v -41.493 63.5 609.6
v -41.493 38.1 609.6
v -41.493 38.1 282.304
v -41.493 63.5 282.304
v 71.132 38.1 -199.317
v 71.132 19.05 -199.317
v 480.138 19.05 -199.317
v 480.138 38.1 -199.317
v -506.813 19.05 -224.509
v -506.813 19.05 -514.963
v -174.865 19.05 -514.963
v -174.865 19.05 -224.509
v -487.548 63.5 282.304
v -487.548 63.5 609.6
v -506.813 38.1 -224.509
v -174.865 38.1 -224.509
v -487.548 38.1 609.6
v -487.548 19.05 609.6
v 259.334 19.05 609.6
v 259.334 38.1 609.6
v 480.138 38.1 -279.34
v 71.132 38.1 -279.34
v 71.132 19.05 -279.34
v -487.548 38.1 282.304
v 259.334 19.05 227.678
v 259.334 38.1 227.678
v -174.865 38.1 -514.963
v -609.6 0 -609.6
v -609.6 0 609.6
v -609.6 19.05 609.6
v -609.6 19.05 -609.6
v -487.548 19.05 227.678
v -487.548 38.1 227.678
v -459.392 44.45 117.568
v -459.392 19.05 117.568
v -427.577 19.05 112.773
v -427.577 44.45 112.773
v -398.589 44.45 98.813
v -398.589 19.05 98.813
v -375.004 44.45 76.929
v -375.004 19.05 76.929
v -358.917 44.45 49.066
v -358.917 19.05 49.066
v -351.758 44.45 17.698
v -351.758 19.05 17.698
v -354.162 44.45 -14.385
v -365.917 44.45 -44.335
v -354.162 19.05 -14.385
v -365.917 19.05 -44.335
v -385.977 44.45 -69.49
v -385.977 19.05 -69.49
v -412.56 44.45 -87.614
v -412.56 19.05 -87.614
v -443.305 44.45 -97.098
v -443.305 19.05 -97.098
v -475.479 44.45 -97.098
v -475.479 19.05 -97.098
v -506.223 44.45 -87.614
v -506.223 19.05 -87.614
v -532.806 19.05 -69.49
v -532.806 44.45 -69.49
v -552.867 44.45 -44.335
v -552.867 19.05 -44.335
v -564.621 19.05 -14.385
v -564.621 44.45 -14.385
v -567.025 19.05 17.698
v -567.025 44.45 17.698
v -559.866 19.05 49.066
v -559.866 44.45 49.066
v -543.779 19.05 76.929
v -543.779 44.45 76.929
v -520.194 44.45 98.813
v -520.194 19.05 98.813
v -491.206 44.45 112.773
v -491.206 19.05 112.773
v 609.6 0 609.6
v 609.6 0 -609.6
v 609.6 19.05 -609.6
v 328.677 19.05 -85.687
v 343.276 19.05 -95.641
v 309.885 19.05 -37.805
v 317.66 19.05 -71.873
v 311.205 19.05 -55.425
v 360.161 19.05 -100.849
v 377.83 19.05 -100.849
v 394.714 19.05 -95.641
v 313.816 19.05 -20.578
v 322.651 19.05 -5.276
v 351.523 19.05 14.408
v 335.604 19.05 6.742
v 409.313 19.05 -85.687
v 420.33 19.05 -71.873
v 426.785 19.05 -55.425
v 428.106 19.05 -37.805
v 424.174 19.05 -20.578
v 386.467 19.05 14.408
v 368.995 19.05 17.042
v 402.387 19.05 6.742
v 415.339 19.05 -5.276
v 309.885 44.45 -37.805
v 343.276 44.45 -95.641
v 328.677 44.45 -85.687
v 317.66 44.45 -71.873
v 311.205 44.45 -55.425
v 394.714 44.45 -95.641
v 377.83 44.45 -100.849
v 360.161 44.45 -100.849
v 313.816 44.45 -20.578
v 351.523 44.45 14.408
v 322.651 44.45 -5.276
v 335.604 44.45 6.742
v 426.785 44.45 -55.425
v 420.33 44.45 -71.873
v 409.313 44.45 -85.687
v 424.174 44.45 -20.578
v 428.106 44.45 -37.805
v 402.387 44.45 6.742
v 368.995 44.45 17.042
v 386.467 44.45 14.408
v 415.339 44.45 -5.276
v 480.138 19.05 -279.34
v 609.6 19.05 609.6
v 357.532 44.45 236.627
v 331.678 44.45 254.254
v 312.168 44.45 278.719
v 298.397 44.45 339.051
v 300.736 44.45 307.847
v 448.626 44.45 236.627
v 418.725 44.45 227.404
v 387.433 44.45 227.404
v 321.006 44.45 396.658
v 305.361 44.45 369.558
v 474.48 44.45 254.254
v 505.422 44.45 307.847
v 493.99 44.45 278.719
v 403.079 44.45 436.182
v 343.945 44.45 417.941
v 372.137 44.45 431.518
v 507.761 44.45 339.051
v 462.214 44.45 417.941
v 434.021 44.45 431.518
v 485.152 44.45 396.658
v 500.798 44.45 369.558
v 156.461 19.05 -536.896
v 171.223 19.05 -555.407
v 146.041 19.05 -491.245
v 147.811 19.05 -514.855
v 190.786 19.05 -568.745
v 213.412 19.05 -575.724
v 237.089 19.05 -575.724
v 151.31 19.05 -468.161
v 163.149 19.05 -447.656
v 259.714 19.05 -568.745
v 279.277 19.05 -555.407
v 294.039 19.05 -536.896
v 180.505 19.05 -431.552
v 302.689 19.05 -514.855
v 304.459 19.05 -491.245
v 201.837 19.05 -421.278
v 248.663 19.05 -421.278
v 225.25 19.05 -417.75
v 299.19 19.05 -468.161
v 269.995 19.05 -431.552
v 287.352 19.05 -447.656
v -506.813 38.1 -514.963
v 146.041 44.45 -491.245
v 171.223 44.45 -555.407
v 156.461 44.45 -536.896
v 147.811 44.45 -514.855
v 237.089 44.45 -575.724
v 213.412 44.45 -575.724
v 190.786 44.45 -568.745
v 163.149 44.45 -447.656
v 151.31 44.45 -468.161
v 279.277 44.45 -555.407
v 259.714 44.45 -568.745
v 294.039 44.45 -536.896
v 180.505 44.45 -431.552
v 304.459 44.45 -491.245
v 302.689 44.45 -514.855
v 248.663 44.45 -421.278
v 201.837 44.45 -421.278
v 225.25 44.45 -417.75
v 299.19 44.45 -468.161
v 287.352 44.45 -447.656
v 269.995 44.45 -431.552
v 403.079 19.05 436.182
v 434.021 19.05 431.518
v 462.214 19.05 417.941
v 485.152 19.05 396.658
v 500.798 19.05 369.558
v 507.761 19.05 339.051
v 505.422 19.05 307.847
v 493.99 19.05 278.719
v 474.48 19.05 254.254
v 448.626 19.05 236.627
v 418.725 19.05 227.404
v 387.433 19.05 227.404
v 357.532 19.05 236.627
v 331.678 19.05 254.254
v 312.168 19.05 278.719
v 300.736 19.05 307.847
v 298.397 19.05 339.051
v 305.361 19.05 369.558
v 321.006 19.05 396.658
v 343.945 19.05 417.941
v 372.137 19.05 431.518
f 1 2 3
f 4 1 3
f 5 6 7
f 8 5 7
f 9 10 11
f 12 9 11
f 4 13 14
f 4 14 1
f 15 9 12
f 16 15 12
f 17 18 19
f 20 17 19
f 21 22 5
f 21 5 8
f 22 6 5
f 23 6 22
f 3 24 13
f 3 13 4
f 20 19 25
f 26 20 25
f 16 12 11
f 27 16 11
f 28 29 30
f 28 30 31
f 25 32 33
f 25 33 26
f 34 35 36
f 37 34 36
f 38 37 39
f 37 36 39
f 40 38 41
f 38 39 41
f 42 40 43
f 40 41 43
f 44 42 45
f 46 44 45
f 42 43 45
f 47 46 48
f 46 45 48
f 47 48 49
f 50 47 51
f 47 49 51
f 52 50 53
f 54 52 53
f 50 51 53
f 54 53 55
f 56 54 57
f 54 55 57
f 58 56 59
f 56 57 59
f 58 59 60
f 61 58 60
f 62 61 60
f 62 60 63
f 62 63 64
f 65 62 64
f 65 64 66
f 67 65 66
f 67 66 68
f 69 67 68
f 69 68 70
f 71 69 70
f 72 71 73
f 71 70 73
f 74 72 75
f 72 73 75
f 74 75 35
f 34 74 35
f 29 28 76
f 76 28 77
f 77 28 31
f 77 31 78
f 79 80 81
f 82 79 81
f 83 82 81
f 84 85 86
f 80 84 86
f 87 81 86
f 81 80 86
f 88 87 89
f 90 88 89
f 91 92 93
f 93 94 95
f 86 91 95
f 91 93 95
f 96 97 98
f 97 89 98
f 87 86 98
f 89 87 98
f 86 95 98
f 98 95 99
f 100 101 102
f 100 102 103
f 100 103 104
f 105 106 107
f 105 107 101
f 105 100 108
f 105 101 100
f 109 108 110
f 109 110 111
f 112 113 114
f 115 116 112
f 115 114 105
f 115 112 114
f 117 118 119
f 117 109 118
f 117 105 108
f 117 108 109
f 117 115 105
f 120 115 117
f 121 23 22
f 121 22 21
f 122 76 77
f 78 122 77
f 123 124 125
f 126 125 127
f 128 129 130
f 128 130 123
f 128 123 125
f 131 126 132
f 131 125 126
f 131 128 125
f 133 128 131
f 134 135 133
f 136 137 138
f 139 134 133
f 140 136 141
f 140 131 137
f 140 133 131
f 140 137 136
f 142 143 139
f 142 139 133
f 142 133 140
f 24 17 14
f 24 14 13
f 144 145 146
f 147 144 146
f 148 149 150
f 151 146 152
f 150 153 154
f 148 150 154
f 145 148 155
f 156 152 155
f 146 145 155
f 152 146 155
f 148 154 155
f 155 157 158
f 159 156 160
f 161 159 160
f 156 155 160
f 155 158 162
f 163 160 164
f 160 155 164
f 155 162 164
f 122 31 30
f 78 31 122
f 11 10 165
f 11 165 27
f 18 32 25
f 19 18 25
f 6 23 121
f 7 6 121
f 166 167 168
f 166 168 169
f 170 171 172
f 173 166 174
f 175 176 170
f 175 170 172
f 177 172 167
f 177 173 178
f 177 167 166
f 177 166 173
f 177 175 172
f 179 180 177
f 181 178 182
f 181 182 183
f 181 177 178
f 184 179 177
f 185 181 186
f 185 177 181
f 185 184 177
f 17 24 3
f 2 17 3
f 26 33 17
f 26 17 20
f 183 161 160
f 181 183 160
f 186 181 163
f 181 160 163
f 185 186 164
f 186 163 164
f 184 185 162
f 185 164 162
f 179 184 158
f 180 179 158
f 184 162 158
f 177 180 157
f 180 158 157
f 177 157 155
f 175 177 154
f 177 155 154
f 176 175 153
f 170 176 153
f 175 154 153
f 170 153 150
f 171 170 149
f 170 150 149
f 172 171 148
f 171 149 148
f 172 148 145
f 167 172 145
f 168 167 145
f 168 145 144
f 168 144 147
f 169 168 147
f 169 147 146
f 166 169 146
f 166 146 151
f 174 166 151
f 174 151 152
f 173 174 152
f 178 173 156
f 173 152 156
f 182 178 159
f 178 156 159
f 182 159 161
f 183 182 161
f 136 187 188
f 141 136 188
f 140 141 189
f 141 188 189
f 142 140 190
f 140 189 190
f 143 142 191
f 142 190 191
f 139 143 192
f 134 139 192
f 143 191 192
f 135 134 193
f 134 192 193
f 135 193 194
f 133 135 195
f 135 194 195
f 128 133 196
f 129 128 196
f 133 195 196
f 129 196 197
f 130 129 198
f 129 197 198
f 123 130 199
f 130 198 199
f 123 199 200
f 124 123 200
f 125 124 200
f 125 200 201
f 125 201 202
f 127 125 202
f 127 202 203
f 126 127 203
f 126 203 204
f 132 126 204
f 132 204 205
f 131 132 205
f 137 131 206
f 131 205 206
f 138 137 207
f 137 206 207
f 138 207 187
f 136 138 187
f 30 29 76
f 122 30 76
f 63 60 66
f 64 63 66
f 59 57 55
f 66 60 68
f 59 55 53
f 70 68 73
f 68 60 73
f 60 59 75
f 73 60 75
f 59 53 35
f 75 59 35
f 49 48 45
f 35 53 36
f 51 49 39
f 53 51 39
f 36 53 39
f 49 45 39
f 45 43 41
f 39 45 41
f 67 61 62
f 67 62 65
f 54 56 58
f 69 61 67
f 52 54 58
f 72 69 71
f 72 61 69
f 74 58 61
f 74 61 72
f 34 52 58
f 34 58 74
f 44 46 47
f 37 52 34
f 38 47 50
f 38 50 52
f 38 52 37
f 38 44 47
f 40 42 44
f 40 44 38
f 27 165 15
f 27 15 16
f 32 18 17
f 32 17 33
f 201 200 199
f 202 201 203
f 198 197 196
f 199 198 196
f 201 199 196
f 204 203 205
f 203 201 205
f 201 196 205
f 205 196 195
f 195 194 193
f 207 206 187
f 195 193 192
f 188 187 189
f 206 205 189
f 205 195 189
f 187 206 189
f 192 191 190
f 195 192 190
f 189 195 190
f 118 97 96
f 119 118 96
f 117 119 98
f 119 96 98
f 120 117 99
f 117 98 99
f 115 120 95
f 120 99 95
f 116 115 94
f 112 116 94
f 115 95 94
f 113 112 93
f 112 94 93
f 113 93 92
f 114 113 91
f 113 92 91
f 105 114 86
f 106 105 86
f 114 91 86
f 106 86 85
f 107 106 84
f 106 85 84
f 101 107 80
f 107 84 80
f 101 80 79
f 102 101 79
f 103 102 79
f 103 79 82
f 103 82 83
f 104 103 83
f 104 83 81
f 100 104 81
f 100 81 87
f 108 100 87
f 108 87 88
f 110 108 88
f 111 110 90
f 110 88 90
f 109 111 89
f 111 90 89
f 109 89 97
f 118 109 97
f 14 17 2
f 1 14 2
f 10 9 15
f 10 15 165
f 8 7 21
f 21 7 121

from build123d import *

# Parameters (mm, degrees)
SKETCH1_W        = 1219.2
SKETCH1_H        = 1219.2
EXTRUDE1_DEPTH   = 19.05
SKETCH2_W        = 331.947557721
SKETCH2_H        = 290.454113006
EXTRUDE2_DEPTH   = 19.05
SKETCH2_W_2      = 409.006812192
SKETCH2_H_2      = 80.02307195
EXTRUDE2_2_DEPTH = 19.05
SKETCH2_W_3      = 746.882004873
SKETCH2_H_3      = 381.921561998
EXTRUDE2_3_DEPTH = 19.05
SKETCH3_W        = 446.054530688
SKETCH3_H        = 327.296385063
EXTRUDE3_DEPTH   = 25.4
SKETCH4_R        = 107.935461677
EXTRUDE4_DEPTH   = 25.4
SKETCH4_R_2      = 59.276349593
EXTRUDE4_2_DEPTH = 25.4
SKETCH4_R_3      = 79.430861404
EXTRUDE4_3_DEPTH = 25.4
SKETCH4_R_4      = 104.975218643
EXTRUDE4_4_DEPTH = 25.4


with BuildPart() as part:
    # Sketch1 → Extrude1 (new body)
    with BuildSketch(Plane(origin=(0, 0, 0), x_dir=(1, 0, 0), z_dir=(0, 1, 0))):
        Rectangle(SKETCH1_W, SKETCH1_H)
    extrude(amount=EXTRUDE1_DEPTH)


with BuildPart() as body_2:
    # Sketch2 → Extrude2 (new body)
    with BuildSketch(Plane(origin=(0, 19.05, 0), x_dir=(1, 0, 0), z_dir=(0, 1, 0))):
        with Locations((-340.839010161, 369.736230587)):
            Rectangle(SKETCH2_W, SKETCH2_H)
    extrude(amount=EXTRUDE2_DEPTH)


with BuildPart() as body_3:
    # Sketch2 → Extrude2 2 (new body)
    with BuildSketch(Plane(origin=(0, 19.05, 0), x_dir=(1, 0, 0), z_dir=(0, 1, 0))):
        with Locations((275.635025608, 239.328261482)):
            Rectangle(SKETCH2_W_2, SKETCH2_H_2)
    extrude(amount=EXTRUDE2_2_DEPTH)


with BuildPart() as body_4:
    # Sketch2 → Extrude2 3 (new body)
    with BuildSketch(Plane(origin=(0, 19.05, 0), x_dir=(1, 0, 0), z_dir=(0, 1, 0))):
        with Locations((-114.106972966, -418.639219001)):
            Rectangle(SKETCH2_W_3, SKETCH2_H_3)
    extrude(amount=EXTRUDE2_3_DEPTH)


with BuildPart() as body_5:
    # Sketch3 → Extrude3 (new body)
    with BuildSketch(Plane(origin=(0, 38.1, 0), x_dir=(1, 0, 0), z_dir=(0, 1, 0))):
        with Locations((-264.520710059, -445.951807469)):
            Rectangle(SKETCH3_W, SKETCH3_H)
    extrude(amount=EXTRUDE3_DEPTH)


with BuildPart() as body_6:
    # Sketch4 → Extrude4 (new body)
    with BuildSketch(Plane(origin=(0, 19.05, 0), x_dir=(1, 0, 0), z_dir=(0, 1, 0))):
        with Locations(Location((-459.391709346, -9.632406809, 0), (0, 0, 270))):  # turned: the seam where the file's is
            Circle(SKETCH4_R)
    extrude(amount=EXTRUDE4_DEPTH)


with BuildPart() as body_7:
    # Sketch4 → Extrude4 2 (new body)
    with BuildSketch(Plane(origin=(0, 19.05, 0), x_dir=(1, 0, 0), z_dir=(0, 1, 0))):
        with Locations(Location((368.995276217, 42.234399085, 0), (0, 0, 270))):  # turned: the seam where the file's is
            Circle(SKETCH4_R_2)
    extrude(amount=EXTRUDE4_2_DEPTH)


with BuildPart() as body_8:
    # Sketch4 → Extrude4 3 (new body)
    with BuildSketch(Plane(origin=(0, 19.05, 0), x_dir=(1, 0, 0), z_dir=(0, 1, 0))):
        with Locations(Location((225.250128454, 497.180382212, 0), (0, 0, 270))):  # turned: the seam where the file's is
            Circle(SKETCH4_R_3)
    extrude(amount=EXTRUDE4_3_DEPTH)


with BuildPart() as body_9:
    # Sketch4 → Extrude4 4 (new body)
    with BuildSketch(Plane(origin=(0, 19.05, 0), x_dir=(1, 0, 0), z_dir=(0, 1, 0))):
        with Locations(Location((403.079177233, -331.206603351, 0), (0, 0, 270))):  # turned: the seam where the file's is
            Circle(SKETCH4_R_4)
    extrude(amount=EXTRUDE4_4_DEPTH)


solid = Compound([part.part, body_2.part, body_3.part, body_4.part, body_5.part, body_6.part, body_7.part, body_8.part, body_9.part])
